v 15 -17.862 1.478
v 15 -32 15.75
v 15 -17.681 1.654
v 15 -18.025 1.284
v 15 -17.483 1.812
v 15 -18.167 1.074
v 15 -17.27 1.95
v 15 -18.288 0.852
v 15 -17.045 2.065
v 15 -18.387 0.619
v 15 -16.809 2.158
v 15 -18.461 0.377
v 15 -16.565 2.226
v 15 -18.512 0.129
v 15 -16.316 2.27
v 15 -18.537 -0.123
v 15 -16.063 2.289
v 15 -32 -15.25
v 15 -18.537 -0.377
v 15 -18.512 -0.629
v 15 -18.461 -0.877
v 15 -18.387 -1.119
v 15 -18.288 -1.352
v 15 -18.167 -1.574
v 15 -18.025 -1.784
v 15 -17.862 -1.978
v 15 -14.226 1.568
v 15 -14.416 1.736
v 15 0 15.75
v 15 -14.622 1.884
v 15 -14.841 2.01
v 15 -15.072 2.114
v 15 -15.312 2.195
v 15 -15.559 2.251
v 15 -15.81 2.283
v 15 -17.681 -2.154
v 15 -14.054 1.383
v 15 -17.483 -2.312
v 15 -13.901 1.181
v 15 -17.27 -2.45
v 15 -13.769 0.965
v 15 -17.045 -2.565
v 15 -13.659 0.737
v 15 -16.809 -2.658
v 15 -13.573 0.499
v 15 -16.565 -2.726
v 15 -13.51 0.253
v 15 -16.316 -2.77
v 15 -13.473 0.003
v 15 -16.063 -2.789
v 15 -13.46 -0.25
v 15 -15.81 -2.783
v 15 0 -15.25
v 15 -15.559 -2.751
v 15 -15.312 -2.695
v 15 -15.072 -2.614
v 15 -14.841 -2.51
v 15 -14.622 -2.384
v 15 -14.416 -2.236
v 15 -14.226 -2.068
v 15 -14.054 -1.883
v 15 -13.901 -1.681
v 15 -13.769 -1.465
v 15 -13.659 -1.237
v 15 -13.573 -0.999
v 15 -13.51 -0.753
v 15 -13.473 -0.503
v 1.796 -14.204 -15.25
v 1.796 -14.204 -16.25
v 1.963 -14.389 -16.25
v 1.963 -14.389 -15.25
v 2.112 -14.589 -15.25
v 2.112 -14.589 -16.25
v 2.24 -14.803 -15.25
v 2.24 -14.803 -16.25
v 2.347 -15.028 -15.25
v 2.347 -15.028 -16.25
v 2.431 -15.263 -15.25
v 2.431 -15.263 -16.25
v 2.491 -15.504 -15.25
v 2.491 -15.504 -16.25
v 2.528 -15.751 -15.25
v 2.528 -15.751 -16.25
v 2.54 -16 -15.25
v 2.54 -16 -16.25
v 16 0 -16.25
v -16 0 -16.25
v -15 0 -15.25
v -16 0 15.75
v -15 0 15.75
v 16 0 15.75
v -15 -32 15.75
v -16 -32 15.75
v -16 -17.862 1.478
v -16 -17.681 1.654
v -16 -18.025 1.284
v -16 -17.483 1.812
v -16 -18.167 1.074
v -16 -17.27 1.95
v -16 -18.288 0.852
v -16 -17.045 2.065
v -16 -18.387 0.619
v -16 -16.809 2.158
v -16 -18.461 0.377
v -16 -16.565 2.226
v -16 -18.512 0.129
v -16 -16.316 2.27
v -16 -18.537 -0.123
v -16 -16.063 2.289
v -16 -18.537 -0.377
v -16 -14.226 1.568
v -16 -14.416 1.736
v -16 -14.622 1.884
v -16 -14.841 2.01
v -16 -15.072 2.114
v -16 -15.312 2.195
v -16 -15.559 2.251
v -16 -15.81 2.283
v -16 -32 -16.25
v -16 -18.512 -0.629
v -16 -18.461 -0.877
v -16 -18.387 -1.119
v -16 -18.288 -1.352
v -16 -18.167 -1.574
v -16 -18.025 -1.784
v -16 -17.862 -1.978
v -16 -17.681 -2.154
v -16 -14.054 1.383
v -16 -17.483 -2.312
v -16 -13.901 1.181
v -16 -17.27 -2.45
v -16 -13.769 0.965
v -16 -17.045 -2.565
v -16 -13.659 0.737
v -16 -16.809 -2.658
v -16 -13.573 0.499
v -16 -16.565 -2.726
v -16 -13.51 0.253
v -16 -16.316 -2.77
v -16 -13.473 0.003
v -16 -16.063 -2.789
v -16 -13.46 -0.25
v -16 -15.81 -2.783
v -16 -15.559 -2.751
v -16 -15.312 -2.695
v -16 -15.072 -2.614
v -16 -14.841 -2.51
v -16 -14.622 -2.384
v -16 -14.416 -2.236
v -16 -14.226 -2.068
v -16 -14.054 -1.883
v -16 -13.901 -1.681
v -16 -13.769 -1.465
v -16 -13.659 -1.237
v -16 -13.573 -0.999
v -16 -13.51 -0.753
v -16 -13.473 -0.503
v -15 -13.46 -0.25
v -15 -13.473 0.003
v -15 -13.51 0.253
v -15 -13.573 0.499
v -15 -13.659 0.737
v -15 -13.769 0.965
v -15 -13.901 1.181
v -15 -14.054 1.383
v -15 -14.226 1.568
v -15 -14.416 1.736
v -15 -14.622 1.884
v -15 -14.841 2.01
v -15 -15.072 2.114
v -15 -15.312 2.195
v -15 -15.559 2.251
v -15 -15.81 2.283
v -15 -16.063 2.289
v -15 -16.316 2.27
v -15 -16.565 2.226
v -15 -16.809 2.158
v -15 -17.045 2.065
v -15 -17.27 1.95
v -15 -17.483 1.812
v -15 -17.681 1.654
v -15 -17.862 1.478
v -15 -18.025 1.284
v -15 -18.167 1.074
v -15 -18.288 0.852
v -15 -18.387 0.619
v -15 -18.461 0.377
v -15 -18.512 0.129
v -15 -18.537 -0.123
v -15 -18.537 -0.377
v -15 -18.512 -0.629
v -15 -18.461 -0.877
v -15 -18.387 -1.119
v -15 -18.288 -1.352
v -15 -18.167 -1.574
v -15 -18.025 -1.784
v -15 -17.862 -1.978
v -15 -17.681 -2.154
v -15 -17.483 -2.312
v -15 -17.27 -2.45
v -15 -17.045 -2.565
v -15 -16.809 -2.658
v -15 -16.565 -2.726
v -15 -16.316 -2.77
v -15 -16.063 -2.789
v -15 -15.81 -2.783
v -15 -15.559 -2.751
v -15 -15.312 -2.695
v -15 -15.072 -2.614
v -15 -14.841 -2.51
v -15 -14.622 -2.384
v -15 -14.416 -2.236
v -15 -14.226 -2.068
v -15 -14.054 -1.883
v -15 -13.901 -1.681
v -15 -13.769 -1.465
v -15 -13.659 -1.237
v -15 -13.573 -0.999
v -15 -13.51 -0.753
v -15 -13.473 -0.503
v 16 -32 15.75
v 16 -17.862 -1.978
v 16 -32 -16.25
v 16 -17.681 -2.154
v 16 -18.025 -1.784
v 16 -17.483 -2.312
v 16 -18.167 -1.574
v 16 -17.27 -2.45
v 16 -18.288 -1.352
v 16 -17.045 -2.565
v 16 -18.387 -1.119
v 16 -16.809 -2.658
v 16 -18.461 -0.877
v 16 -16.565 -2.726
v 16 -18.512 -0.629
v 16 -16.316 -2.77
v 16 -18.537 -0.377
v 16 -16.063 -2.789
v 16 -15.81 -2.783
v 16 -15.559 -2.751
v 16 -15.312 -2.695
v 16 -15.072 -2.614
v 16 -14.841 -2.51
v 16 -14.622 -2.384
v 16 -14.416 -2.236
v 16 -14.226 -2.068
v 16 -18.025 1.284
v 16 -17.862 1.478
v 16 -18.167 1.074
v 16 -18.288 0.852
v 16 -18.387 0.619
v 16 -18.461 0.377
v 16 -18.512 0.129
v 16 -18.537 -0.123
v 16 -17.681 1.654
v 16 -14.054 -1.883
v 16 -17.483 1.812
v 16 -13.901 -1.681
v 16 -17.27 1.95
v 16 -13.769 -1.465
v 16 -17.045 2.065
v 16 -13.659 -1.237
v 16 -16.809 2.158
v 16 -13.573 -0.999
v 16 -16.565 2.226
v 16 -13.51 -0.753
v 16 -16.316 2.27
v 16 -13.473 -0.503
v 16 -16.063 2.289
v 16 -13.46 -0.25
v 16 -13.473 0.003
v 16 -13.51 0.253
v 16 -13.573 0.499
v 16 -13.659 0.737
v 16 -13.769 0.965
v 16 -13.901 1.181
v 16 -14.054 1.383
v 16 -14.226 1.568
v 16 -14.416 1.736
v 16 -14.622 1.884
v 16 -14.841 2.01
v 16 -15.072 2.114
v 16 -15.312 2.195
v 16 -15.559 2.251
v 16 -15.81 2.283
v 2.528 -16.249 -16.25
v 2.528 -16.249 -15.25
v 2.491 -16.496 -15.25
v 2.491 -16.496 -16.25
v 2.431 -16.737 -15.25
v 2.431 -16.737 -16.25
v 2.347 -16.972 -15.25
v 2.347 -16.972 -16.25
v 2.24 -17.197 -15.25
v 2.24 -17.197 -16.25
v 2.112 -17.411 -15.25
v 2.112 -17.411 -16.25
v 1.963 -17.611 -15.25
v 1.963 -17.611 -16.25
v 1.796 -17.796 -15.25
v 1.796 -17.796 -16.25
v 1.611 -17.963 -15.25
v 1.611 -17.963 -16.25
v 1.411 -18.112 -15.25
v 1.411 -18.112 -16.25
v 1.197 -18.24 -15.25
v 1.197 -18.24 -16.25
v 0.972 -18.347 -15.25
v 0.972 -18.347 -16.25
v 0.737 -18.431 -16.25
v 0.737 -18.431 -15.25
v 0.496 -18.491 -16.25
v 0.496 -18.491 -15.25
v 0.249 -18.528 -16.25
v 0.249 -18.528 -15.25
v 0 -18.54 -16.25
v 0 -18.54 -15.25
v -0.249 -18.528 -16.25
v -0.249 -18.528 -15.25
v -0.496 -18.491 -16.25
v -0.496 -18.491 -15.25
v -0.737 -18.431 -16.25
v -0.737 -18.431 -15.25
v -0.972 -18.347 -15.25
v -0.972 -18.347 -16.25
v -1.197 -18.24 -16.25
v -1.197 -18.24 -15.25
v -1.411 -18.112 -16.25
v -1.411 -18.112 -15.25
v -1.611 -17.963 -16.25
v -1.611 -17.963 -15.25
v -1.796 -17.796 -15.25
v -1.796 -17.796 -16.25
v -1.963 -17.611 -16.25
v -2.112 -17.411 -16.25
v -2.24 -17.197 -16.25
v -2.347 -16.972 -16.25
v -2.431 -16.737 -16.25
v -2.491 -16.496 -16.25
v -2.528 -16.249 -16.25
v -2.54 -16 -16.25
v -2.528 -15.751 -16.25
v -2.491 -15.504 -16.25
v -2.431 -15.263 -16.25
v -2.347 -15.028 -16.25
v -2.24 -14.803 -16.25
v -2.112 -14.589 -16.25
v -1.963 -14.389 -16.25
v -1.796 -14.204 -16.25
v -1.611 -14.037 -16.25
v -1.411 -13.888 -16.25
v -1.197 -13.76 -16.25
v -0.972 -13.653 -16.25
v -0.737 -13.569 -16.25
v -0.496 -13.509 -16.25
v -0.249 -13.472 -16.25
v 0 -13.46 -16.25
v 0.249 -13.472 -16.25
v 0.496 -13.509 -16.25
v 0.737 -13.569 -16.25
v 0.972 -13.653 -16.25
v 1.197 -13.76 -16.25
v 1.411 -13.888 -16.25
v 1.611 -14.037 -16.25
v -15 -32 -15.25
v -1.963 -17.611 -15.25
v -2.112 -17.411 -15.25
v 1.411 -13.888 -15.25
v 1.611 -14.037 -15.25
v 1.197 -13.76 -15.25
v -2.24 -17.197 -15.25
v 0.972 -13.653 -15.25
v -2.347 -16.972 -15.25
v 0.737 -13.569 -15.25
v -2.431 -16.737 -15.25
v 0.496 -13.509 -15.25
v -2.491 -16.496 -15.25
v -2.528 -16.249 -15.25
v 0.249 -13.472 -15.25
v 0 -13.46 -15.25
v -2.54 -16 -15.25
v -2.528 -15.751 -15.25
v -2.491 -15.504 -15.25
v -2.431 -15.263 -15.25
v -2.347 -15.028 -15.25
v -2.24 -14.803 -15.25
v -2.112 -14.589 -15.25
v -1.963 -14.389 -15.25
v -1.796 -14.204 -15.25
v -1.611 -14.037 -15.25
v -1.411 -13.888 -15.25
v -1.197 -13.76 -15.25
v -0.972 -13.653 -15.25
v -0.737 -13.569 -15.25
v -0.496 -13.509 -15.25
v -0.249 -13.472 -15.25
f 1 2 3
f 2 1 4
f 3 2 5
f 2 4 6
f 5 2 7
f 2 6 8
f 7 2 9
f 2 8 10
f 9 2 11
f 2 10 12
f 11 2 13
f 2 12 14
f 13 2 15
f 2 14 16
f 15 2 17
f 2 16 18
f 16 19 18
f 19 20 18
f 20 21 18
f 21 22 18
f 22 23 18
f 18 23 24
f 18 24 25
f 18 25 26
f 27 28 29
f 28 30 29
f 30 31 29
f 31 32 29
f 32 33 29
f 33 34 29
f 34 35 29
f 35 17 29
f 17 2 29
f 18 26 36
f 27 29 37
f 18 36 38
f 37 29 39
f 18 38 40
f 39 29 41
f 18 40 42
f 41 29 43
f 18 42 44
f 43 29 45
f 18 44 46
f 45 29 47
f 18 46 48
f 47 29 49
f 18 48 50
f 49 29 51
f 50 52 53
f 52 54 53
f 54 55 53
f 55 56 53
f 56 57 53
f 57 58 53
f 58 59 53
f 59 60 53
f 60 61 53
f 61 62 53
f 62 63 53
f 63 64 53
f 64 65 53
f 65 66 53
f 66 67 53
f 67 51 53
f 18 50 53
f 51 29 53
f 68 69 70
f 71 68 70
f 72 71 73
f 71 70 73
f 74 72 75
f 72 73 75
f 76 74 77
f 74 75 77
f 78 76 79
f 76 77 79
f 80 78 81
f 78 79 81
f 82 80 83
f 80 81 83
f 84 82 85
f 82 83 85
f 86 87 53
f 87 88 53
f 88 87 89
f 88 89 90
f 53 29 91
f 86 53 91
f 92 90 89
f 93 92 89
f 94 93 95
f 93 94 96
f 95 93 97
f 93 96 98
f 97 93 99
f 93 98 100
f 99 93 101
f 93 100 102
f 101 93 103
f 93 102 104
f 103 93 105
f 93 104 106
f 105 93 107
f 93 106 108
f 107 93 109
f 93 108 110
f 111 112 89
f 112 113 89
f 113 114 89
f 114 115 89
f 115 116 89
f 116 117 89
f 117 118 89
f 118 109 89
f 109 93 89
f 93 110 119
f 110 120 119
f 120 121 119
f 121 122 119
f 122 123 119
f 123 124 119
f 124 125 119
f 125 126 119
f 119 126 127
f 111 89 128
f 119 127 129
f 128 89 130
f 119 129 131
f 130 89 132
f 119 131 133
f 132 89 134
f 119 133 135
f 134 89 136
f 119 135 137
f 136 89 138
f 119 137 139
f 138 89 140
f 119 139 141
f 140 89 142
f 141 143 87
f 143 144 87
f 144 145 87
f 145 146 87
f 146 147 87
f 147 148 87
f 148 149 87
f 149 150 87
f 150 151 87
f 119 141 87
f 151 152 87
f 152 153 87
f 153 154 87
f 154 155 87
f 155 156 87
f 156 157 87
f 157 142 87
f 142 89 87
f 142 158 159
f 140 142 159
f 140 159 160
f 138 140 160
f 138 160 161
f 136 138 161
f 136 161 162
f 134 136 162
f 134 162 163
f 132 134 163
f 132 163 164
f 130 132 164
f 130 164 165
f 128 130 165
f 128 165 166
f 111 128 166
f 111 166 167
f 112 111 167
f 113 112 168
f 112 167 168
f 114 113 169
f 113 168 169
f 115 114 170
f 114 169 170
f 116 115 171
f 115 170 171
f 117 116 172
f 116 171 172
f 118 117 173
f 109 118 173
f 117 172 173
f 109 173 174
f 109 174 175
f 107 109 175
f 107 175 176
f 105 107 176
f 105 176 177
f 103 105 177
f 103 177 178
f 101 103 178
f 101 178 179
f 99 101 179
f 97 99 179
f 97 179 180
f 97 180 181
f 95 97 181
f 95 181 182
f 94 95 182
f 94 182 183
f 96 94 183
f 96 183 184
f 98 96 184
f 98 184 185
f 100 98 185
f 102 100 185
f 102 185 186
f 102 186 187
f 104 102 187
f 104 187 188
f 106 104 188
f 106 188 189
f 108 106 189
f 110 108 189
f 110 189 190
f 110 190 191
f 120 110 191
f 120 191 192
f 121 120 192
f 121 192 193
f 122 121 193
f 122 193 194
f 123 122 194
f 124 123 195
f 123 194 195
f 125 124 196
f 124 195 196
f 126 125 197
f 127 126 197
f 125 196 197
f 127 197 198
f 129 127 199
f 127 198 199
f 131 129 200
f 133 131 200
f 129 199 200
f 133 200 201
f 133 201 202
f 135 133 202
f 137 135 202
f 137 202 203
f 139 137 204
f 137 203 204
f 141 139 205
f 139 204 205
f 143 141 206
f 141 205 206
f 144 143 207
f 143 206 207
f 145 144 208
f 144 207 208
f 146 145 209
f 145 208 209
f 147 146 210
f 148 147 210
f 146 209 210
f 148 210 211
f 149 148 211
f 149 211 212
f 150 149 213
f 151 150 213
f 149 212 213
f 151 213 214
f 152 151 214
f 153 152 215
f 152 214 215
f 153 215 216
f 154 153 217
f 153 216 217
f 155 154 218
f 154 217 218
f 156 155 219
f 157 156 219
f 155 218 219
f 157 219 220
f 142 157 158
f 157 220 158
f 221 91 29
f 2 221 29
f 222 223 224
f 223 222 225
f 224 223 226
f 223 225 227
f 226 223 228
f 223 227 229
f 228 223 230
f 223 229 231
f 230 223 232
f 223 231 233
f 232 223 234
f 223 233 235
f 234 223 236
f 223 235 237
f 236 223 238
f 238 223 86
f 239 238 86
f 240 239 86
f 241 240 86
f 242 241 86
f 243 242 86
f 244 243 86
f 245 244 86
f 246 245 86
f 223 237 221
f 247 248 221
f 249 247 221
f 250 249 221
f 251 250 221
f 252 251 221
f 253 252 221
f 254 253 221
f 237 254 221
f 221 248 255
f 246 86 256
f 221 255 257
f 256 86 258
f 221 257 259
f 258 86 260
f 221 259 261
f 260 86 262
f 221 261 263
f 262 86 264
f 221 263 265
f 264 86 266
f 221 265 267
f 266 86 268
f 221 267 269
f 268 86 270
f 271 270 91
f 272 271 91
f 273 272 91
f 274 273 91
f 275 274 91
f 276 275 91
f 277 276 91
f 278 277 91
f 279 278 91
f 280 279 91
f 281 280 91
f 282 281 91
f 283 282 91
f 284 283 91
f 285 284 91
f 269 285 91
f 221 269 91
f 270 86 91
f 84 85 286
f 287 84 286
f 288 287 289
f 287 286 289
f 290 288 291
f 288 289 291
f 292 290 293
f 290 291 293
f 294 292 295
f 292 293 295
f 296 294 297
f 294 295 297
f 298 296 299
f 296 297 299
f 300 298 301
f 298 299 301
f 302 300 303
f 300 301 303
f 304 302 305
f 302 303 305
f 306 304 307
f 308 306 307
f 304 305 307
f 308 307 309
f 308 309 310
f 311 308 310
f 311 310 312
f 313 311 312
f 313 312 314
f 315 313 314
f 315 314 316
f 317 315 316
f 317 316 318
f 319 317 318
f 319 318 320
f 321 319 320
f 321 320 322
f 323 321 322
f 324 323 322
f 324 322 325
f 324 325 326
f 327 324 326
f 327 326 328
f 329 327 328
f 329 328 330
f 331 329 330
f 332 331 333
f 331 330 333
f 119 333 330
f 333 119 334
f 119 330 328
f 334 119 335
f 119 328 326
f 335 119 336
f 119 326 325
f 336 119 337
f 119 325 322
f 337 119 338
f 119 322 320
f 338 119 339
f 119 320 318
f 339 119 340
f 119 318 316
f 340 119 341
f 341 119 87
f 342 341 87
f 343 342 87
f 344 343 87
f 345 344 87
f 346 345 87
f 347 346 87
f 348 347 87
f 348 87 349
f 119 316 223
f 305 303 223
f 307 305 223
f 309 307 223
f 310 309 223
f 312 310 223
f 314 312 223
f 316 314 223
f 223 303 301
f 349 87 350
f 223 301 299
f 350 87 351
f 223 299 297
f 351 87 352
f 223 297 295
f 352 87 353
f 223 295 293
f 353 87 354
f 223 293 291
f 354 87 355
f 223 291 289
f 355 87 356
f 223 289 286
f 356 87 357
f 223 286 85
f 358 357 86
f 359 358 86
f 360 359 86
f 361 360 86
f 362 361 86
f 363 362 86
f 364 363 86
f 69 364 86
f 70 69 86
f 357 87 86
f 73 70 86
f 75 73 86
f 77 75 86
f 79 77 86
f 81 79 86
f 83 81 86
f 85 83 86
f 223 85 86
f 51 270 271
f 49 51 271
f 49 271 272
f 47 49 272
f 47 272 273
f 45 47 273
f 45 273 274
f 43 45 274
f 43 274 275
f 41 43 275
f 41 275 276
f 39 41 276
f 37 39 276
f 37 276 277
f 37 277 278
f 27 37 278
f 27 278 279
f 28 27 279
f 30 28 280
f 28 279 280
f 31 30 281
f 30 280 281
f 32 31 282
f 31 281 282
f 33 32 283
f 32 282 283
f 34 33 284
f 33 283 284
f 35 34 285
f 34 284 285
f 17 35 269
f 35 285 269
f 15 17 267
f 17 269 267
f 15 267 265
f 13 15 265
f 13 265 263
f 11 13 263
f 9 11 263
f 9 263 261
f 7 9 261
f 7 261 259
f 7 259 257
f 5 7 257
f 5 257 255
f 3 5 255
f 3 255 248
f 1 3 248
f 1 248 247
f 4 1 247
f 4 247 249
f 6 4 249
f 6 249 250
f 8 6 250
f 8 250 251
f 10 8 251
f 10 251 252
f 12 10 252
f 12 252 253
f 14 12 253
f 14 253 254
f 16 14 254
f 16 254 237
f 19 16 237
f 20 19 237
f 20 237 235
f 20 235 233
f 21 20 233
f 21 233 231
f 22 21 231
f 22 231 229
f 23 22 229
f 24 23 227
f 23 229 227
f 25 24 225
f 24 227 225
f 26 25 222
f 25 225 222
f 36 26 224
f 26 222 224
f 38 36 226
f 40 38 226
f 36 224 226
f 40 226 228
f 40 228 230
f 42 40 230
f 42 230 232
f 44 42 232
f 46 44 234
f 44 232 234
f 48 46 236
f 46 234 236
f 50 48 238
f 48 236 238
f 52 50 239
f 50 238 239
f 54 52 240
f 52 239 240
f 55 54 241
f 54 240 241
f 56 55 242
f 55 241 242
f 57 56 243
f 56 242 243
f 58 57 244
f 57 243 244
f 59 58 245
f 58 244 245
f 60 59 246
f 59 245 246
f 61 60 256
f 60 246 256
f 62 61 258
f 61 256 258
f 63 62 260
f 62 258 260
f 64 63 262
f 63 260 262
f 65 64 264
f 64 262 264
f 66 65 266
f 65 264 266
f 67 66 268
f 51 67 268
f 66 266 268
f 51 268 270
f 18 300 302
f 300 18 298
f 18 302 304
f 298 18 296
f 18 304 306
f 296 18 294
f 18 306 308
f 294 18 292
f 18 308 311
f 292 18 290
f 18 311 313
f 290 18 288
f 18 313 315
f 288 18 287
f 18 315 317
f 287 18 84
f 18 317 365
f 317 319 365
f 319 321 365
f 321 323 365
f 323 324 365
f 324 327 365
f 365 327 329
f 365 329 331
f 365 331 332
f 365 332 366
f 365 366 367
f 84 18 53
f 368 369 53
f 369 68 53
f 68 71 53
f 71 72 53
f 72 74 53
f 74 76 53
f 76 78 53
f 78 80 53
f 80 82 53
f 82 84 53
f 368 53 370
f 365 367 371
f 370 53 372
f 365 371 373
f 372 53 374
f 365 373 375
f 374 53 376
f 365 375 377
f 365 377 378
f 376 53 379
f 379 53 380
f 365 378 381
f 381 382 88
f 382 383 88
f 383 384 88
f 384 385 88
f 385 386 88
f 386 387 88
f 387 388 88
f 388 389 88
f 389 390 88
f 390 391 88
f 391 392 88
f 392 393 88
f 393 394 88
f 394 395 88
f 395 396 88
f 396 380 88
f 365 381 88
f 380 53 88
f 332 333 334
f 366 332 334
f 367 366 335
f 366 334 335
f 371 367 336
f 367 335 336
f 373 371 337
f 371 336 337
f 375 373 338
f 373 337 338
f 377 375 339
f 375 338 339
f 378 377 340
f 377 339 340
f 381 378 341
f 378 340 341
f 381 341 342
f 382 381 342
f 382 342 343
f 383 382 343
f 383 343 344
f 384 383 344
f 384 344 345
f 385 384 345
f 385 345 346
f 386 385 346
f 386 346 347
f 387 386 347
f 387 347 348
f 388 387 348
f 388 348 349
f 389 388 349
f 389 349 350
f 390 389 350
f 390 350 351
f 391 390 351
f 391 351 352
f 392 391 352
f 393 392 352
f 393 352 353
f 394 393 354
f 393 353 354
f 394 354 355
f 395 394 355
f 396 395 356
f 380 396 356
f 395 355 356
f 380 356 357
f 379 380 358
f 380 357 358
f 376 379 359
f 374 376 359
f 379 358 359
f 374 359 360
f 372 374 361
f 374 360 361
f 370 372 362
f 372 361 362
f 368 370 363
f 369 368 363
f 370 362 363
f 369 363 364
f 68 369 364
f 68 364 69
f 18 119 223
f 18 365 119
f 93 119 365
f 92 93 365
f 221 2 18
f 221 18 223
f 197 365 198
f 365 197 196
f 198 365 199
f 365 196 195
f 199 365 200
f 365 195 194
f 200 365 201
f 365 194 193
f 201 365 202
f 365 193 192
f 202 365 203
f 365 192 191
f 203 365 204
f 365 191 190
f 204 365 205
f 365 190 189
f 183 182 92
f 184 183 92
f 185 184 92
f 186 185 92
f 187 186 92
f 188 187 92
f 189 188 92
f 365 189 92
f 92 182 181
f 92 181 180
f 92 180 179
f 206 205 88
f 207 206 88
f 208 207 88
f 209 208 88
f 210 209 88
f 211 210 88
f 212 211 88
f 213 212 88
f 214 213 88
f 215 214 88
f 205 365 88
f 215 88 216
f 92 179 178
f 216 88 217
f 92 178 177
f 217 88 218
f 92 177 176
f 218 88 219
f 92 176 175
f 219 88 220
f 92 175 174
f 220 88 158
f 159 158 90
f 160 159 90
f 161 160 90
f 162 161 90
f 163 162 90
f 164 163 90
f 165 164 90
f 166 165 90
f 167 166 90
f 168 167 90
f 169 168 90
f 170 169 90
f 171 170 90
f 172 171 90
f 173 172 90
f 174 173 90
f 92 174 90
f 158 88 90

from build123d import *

# Parameters (mm, degrees)
F1_DEPTH = 32
F2_R     = 2.54
F3_DEPTH = 228.6
F5_DEPTH = 76.2


with BuildPart() as f1:
    # F0 (on Front) → F1 (new body)
    with BuildSketch(Plane.XZ):
        Polygon((-15, 15.75), (-16, 15.75), (-16, -16.25), (16, -16.25), (16, 15.75), (15, 15.75), (15, -15.25), (-15, -15.25), align=None)
    extrude(amount=F1_DEPTH)

    # F2 (on face) → F3 (cut)
    with BuildSketch(Plane.YZ.offset(16)):
        with Locations((-16, -0.25)):
            Circle(F2_R)
    extrude(amount=-F3_DEPTH, mode=Mode.SUBTRACT)

    # F4 (on face) → F5 (cut)
    with BuildSketch(Plane(origin=(0, 0, -16.25), x_dir=(1, 0, 0), z_dir=(0, 0, -1))):
        with BuildLine():
            Line((1.7960512242, 14.2039487758), (-1.7960512242, 17.7960512242))
            ThreePointArc((-1.7960512242, 17.7960512242), (-1.7960512242, 14.2039487758), (1.7960512242, 14.2039487758))
        make_face()
        with BuildLine():
            ThreePointArc((2.54, 16), (0.9720159182, 18.3466540126), (-1.7960512242, 17.7960512242))
            Line((-1.7960512242, 17.7960512242), (1.7960512242, 14.2039487758))
            ThreePointArc((1.7960512242, 14.2039487758), (2.3466540126, 15.0279840818), (2.54, 16))
        make_face()
    extrude(amount=-F5_DEPTH, mode=Mode.SUBTRACT)


solid = f1.part
